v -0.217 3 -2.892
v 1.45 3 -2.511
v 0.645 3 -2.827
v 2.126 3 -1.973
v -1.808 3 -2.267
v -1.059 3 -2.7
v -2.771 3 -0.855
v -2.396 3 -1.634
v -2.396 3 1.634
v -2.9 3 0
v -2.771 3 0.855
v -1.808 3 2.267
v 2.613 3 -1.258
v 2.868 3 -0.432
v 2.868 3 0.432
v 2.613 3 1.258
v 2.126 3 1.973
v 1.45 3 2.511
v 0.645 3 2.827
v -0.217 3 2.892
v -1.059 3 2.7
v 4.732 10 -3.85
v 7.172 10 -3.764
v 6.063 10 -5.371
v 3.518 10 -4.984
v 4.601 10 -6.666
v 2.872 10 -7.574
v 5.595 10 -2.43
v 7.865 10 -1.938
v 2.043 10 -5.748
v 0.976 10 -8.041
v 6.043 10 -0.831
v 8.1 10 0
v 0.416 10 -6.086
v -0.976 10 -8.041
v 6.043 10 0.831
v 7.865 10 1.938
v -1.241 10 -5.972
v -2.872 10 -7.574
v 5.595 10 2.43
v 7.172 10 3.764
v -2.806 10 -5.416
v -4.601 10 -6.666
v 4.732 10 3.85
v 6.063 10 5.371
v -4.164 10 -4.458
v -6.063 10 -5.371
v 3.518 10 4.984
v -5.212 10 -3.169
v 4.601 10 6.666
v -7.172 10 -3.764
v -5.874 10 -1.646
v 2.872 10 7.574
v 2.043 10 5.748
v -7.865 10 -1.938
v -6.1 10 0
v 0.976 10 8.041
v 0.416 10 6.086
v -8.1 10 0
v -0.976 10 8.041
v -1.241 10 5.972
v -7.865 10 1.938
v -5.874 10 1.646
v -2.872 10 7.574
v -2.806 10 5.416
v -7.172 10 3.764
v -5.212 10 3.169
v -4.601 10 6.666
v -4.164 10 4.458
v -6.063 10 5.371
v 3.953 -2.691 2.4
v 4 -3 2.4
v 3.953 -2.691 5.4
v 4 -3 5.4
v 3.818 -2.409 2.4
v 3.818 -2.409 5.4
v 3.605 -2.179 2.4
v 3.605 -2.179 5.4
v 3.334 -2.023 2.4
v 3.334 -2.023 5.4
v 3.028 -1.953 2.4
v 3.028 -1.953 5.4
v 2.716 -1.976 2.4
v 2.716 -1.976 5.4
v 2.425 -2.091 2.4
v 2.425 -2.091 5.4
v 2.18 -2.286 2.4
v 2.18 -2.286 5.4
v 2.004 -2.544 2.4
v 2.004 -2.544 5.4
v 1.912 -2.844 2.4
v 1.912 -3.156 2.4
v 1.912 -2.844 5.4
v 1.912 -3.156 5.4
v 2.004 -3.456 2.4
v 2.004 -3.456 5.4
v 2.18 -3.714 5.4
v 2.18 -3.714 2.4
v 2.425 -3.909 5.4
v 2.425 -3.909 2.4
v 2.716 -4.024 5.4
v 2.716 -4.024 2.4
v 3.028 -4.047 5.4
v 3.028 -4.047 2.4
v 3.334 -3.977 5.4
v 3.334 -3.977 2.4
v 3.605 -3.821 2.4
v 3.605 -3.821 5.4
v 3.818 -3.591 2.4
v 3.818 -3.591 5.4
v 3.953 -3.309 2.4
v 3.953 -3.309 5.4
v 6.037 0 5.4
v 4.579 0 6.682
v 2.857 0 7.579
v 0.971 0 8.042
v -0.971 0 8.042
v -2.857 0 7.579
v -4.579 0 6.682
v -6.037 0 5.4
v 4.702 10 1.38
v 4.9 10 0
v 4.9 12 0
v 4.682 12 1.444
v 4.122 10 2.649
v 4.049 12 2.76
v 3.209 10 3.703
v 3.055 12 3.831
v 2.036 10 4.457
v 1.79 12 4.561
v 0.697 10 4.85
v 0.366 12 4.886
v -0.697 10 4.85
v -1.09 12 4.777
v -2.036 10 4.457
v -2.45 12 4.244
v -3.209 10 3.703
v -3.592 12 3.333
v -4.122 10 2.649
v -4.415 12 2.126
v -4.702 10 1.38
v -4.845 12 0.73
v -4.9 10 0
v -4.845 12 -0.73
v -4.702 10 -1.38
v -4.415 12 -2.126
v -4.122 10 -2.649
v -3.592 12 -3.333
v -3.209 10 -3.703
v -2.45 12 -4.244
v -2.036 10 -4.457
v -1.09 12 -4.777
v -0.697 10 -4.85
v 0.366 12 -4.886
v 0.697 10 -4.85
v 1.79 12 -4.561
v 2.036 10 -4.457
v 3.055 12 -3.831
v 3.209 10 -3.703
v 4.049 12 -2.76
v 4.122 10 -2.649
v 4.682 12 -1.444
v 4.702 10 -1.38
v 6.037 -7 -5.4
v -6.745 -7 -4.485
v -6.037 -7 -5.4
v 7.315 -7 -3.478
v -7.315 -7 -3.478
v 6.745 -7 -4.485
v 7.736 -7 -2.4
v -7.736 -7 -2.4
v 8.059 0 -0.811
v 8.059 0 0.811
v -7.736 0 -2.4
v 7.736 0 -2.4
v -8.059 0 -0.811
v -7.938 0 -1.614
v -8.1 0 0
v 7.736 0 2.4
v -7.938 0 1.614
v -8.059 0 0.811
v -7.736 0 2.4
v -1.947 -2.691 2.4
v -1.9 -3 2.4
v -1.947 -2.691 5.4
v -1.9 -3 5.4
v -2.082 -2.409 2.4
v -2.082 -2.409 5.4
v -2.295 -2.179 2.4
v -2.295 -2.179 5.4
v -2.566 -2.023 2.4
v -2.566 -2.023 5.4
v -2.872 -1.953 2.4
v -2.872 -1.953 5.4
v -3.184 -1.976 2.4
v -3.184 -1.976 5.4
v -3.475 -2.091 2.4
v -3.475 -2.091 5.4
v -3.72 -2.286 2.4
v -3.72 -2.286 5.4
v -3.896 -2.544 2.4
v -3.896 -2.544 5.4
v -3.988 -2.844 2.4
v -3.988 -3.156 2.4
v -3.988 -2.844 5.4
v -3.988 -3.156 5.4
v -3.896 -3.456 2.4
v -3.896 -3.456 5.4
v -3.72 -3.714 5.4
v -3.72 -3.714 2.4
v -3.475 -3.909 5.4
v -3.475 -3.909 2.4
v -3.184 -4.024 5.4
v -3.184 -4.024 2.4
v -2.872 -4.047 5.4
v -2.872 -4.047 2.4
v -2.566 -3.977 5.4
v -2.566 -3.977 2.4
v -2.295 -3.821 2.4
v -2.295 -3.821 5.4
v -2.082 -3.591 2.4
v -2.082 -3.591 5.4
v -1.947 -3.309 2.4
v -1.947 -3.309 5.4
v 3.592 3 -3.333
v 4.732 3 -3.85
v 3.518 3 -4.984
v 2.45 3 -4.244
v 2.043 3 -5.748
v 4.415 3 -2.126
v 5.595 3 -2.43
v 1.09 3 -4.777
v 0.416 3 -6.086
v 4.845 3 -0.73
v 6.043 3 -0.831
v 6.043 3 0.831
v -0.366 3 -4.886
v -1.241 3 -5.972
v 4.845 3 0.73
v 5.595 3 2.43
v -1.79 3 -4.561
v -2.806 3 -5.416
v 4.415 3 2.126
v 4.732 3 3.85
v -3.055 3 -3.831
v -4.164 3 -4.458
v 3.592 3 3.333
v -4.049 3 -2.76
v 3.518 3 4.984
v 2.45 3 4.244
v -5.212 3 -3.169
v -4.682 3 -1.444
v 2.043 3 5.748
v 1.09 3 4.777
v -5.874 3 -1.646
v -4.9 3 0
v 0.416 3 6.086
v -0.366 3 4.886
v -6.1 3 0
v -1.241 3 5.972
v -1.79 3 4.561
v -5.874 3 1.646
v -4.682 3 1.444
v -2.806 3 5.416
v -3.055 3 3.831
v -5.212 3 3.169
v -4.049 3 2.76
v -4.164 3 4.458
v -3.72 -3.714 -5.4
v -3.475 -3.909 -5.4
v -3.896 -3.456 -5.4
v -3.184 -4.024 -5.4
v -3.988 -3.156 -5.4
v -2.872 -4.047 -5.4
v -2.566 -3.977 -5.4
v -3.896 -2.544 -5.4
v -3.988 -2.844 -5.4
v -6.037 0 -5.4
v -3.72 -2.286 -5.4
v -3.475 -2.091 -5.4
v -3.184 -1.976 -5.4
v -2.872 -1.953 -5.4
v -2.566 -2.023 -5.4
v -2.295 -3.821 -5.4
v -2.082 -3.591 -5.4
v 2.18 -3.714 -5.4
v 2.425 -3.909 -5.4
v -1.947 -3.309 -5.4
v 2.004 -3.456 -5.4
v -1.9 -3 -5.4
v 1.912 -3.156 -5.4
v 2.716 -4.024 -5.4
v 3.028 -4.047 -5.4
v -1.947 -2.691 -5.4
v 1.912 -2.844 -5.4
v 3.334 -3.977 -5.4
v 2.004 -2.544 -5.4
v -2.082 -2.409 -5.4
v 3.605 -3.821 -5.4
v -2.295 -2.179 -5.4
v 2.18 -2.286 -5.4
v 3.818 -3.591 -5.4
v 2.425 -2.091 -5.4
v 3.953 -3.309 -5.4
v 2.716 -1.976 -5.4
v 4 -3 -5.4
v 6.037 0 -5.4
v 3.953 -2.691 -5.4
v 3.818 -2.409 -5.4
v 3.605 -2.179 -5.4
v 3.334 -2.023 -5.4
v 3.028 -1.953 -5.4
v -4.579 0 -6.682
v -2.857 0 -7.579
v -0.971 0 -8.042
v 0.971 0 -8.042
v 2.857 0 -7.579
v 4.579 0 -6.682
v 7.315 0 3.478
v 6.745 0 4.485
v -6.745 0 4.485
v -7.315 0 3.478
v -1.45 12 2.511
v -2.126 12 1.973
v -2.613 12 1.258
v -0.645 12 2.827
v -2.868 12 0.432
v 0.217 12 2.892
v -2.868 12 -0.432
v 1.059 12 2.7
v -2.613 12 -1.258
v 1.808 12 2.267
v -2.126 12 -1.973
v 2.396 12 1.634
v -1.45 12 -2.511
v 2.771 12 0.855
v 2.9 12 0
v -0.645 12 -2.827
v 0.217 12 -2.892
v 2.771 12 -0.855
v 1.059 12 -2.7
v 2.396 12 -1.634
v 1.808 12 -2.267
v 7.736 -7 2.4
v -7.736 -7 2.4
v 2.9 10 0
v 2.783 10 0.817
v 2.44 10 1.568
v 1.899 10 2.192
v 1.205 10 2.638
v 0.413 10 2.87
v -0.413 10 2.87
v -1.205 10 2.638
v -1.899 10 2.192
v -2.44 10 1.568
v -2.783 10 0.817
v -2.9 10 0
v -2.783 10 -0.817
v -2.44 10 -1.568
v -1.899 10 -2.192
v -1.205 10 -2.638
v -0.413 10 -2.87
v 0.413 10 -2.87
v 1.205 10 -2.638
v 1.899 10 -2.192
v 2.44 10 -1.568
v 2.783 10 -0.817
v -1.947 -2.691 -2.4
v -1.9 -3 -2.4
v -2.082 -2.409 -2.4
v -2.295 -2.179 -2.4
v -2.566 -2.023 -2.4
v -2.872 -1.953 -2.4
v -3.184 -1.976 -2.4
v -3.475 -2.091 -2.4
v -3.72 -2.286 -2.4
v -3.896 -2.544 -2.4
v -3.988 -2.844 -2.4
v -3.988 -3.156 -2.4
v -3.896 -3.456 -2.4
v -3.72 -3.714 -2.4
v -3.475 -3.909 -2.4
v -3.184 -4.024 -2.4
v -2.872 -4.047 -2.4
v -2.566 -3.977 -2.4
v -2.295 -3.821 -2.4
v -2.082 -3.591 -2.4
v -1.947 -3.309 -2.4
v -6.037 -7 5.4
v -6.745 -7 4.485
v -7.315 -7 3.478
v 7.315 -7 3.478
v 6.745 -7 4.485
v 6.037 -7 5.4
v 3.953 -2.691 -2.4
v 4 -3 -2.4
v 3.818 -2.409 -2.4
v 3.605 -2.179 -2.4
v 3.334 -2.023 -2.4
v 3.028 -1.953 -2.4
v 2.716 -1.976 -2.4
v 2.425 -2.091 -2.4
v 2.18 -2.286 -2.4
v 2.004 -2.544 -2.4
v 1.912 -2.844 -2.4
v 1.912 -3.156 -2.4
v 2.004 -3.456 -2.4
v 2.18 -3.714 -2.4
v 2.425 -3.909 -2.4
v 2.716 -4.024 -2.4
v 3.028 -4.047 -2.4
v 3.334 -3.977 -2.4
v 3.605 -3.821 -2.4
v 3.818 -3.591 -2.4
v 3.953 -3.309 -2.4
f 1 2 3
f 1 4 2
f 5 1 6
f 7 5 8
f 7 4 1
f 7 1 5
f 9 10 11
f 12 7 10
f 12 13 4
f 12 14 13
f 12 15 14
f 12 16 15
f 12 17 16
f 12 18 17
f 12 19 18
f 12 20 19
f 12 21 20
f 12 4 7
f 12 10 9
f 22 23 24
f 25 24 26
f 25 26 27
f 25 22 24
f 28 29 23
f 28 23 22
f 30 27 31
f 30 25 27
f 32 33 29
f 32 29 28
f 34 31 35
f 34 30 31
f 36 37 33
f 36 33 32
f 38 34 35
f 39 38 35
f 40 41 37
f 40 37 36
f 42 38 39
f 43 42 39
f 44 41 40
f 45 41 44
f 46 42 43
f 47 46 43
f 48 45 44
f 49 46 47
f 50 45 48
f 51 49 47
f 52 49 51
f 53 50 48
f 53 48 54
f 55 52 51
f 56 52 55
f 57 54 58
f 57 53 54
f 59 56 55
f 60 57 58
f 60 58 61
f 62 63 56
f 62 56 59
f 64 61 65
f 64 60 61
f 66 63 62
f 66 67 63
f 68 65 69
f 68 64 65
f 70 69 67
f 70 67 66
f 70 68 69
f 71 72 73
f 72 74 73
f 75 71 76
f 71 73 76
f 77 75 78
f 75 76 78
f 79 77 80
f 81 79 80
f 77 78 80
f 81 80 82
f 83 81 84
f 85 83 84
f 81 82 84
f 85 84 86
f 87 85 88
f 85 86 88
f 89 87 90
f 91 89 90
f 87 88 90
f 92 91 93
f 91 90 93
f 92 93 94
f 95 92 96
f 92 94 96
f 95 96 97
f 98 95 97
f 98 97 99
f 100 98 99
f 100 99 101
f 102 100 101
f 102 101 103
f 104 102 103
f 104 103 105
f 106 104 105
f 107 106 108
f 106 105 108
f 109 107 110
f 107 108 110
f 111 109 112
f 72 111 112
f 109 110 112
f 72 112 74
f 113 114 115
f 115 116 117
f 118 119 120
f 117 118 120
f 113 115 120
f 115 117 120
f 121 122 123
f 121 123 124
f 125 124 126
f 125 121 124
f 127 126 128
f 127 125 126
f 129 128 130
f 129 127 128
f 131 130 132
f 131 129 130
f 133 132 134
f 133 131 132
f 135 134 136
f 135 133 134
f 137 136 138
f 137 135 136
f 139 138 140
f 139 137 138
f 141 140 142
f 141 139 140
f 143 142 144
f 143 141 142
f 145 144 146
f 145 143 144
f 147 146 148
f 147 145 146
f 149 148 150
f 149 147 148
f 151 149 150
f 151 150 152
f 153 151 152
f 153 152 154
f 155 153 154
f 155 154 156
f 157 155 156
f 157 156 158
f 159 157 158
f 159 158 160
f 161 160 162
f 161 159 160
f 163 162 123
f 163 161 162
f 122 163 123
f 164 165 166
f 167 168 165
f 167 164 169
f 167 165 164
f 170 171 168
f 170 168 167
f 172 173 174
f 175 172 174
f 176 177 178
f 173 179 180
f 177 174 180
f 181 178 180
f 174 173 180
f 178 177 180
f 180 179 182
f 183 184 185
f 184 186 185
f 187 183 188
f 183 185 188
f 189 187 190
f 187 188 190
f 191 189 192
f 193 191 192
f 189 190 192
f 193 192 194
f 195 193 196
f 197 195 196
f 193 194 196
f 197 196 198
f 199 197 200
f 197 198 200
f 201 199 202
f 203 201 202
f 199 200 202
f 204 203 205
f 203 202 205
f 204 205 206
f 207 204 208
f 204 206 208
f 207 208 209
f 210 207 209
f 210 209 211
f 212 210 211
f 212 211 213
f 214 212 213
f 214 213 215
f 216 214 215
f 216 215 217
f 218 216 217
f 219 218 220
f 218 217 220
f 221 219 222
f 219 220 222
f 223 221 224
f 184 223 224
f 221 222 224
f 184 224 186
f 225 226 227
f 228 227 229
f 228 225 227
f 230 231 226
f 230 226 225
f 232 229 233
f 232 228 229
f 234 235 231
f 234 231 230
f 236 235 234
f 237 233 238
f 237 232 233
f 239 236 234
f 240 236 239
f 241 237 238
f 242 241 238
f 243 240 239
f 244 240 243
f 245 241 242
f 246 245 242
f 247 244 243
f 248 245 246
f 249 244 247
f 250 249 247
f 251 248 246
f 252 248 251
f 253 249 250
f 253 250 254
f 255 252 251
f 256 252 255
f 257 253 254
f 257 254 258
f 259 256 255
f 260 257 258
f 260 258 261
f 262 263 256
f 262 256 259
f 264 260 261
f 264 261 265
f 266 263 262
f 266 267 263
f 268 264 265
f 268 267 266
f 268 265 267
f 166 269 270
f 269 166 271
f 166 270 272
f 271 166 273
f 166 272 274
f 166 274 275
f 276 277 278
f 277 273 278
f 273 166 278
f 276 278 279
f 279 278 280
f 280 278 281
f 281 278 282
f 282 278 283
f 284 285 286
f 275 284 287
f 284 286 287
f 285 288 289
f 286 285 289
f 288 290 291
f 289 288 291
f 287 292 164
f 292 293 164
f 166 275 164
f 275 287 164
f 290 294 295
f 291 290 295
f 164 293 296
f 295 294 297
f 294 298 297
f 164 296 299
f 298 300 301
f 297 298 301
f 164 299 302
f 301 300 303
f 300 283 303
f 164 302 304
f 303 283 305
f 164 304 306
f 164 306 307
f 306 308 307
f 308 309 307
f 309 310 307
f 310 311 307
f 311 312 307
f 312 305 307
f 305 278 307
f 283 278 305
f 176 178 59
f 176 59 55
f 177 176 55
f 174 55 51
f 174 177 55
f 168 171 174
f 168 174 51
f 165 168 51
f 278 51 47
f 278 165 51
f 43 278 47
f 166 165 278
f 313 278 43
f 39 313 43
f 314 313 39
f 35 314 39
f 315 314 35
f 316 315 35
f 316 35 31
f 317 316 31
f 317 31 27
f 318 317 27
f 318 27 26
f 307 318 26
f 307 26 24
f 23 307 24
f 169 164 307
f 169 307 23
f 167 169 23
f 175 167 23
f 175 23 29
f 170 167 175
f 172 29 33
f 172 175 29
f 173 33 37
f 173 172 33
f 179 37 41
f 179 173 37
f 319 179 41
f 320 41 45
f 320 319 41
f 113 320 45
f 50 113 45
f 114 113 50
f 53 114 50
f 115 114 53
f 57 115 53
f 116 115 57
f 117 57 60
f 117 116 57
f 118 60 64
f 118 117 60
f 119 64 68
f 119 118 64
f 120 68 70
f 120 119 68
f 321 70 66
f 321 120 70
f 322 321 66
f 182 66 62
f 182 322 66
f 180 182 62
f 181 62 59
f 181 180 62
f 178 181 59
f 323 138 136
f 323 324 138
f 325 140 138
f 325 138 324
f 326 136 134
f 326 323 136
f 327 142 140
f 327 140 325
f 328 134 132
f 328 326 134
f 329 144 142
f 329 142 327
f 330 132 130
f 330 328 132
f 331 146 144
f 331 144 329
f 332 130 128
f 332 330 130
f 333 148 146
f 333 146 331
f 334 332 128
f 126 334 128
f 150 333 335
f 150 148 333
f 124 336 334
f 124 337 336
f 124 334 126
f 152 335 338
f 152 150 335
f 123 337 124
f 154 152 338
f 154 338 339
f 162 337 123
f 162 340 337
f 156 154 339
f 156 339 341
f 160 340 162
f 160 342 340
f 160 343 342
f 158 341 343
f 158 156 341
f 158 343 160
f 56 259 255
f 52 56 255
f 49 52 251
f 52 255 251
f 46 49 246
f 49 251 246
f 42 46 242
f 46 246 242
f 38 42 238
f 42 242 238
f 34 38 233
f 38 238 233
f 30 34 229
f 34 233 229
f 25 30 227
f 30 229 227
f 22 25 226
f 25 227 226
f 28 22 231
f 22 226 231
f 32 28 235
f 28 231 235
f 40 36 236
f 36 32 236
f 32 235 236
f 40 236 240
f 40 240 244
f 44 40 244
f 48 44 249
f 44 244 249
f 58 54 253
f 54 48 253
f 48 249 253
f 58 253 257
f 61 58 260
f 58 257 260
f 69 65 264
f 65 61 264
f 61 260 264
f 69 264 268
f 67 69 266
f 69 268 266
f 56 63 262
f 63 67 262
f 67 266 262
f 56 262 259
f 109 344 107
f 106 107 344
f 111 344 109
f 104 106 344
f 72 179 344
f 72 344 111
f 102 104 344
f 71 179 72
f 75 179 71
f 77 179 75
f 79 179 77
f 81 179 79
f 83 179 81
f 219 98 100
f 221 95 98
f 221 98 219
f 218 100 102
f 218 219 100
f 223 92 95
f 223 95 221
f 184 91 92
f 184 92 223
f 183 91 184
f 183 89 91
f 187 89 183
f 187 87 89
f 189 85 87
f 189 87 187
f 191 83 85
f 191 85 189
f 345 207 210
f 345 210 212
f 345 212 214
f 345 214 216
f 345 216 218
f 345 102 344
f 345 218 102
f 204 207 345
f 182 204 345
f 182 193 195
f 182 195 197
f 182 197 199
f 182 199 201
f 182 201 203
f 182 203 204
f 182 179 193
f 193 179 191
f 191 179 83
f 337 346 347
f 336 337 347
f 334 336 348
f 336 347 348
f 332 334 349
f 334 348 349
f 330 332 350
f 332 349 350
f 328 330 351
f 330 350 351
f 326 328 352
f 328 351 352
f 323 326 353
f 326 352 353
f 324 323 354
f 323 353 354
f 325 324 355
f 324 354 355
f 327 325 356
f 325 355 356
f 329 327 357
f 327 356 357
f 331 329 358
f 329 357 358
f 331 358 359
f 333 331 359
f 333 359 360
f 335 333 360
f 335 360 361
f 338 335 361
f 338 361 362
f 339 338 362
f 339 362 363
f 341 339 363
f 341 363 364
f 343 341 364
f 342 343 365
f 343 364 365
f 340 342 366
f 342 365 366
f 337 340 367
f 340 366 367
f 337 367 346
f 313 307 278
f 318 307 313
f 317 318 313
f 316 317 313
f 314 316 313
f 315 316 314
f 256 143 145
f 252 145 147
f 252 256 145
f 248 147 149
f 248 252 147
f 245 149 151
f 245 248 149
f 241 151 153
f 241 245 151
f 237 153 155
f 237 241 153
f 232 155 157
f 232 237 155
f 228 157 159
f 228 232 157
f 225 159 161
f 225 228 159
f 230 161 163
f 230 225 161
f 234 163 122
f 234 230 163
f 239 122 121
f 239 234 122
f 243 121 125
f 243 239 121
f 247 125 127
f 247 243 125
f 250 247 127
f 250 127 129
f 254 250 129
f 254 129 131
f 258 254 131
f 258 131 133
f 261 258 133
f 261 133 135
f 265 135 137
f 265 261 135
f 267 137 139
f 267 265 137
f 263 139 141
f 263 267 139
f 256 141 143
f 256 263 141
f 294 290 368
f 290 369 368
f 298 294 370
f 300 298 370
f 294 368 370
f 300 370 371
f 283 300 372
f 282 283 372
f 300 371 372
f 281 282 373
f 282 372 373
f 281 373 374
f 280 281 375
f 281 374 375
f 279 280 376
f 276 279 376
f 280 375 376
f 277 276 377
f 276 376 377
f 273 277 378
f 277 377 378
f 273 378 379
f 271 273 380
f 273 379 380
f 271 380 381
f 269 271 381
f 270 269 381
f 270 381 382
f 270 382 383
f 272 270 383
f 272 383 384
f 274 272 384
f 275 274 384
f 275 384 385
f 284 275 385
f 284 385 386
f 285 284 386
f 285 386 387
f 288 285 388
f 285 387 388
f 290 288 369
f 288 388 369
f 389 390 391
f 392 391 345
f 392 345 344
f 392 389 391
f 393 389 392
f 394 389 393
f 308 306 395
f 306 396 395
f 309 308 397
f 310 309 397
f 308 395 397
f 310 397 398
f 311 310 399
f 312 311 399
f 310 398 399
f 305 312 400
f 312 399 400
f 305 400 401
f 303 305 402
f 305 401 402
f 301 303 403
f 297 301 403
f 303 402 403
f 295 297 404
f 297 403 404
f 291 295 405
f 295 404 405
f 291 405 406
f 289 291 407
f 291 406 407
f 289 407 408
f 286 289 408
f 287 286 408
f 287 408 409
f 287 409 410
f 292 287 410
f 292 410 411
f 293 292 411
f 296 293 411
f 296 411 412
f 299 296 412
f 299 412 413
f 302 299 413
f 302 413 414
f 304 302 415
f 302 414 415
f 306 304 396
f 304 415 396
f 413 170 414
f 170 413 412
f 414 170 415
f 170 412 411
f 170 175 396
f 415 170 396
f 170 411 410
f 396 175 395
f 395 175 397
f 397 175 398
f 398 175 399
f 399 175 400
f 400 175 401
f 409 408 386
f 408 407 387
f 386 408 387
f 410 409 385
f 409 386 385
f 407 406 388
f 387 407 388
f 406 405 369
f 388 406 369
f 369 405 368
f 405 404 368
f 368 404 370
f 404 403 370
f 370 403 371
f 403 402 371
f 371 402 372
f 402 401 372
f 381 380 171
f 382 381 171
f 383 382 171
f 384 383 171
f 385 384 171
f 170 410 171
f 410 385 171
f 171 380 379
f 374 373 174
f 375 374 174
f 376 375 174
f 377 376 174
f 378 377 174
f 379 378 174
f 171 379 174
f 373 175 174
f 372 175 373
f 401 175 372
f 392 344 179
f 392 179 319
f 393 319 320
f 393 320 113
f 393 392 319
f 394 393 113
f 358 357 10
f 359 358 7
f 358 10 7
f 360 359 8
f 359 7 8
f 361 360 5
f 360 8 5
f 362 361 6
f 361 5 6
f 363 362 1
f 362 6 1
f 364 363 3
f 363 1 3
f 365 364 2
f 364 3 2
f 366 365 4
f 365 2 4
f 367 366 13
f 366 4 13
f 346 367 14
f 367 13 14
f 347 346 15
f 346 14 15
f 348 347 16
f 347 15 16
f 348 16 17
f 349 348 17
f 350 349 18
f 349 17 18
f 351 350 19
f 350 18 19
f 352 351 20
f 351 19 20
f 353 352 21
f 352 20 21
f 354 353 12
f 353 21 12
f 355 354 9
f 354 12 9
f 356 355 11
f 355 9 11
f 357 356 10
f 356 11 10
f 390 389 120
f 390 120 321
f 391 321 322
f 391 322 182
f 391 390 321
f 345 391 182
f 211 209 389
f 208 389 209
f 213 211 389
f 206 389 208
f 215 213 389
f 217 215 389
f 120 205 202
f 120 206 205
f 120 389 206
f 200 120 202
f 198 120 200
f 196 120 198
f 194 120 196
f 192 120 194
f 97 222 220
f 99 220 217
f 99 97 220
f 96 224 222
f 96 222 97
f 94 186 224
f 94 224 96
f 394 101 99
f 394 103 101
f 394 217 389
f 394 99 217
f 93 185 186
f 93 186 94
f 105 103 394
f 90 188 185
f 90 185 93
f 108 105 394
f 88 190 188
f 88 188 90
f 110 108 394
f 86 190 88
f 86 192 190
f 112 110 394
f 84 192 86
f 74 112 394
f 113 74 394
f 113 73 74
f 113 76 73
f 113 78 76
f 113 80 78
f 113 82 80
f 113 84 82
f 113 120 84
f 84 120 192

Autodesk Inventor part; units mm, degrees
ref_plane "XZ Plane" through (0, 0, 0) normal (0, 1, 0) x (-1, 0, 0)
sketch "Sketch1" plane through (0, 0, 0) normal (0, 1, 0) x (-1, 0, 0)
  circle A0 centre (0, 0) radius 6.1
  circle A1 centre (0, 0) radius 4.9
  circle A2 centre (0, 0) radius 8.1
  circle A3 centre (0, 0) radius 2.9
  dimension "d0" = 12.2
  dimension "d1" = 9.8
  dimension "d2" = 2
  dimension "d5" = 2
extrude "Extrusion1" add sketch "Sketch1" along normal blind 3 contours A0 | A1 | A2 | A3
extrude "Extrusion2" add sketch "Sketch1" along normal blind 10
sketch "Sketch7" plane through (0, 0, 0) normal (0, -1, 0) x (1, 0, 0)
  circle A0 centre (0, 0) radius 8.1 projected
  line L0 (7.7363, -2.4) -> (-7.7363, -2.4)
  line L1 (-7.7363, -2.4) -> (-7.7363, -5.4)
  line L2 (-7.7363, -5.4) -> (7.7363, -5.4)
  line L3 (7.7363, -5.4) -> (7.7363, -2.4)
  line L4 (7.7363, 2.4) -> (-7.7363, 2.4)
  line L5 (-7.7363, 2.4) -> (-7.7363, 5.4)
  line L6 (-7.7363, 5.4) -> (7.7363, 5.4)
  line L7 (7.7363, 5.4) -> (7.7363, 2.4)
  point P0 (6.0374, 5.4)
  point P1 (-6.0374, 5.4)
  point P2 (-6.0374, -5.4)
  point P3 (6.0374, -5.4)
  dimension "d34" = 3
  dimension "d35" = 3
  dimension "d36" = 4.8
  dimension "d37" = 2.4
extrude "Extrusion7" add sketch "Sketch7" along normal blind 7 contours L4 A0 L6 | A0 L2 L0
sketch "Sketch8" plane through (-6.0374, 0, 5.4) normal (0, 0, 1) x (1, 0, 0)
  circle A0 centre (3.0874, -3) radius 1.05
  circle A1 centre (8.9874, -3) radius 1.05
  line L0 (12.0748, 0) -> (0, 0) projected
  point P0 (6.0374, 0)
  dimension "d40" = 2.1
  dimension "d41" = 2.1
  dimension "d42" = 3
  dimension "d43" = 3
  dimension "d44" = 5.9
  dimension "d45" = 2.95
extrude "Extrusion8" cut sketch "Sketch8" against normal blind 20
sketch "Sketch9" plane through (0, 10, 0) normal (0, 1, 0) x (1, 0, 0)
  circle A0 centre (0, 0) radius 6.1 projected
  circle A1 centre (0, 0) radius 2.9 projected
  circle A2 centre (0, 0) radius 4.9 projected
  circle A3 centre (0, 0) radius 8.1 projected
extrude "Extrusion9" add sketch "Sketch9" along normal blind 2 contours A2
equation "\"d37\" = 0.5 * d36"
equation "\"d45\" = 0.5 * d44"
properties part number "Feather_0_clip"
